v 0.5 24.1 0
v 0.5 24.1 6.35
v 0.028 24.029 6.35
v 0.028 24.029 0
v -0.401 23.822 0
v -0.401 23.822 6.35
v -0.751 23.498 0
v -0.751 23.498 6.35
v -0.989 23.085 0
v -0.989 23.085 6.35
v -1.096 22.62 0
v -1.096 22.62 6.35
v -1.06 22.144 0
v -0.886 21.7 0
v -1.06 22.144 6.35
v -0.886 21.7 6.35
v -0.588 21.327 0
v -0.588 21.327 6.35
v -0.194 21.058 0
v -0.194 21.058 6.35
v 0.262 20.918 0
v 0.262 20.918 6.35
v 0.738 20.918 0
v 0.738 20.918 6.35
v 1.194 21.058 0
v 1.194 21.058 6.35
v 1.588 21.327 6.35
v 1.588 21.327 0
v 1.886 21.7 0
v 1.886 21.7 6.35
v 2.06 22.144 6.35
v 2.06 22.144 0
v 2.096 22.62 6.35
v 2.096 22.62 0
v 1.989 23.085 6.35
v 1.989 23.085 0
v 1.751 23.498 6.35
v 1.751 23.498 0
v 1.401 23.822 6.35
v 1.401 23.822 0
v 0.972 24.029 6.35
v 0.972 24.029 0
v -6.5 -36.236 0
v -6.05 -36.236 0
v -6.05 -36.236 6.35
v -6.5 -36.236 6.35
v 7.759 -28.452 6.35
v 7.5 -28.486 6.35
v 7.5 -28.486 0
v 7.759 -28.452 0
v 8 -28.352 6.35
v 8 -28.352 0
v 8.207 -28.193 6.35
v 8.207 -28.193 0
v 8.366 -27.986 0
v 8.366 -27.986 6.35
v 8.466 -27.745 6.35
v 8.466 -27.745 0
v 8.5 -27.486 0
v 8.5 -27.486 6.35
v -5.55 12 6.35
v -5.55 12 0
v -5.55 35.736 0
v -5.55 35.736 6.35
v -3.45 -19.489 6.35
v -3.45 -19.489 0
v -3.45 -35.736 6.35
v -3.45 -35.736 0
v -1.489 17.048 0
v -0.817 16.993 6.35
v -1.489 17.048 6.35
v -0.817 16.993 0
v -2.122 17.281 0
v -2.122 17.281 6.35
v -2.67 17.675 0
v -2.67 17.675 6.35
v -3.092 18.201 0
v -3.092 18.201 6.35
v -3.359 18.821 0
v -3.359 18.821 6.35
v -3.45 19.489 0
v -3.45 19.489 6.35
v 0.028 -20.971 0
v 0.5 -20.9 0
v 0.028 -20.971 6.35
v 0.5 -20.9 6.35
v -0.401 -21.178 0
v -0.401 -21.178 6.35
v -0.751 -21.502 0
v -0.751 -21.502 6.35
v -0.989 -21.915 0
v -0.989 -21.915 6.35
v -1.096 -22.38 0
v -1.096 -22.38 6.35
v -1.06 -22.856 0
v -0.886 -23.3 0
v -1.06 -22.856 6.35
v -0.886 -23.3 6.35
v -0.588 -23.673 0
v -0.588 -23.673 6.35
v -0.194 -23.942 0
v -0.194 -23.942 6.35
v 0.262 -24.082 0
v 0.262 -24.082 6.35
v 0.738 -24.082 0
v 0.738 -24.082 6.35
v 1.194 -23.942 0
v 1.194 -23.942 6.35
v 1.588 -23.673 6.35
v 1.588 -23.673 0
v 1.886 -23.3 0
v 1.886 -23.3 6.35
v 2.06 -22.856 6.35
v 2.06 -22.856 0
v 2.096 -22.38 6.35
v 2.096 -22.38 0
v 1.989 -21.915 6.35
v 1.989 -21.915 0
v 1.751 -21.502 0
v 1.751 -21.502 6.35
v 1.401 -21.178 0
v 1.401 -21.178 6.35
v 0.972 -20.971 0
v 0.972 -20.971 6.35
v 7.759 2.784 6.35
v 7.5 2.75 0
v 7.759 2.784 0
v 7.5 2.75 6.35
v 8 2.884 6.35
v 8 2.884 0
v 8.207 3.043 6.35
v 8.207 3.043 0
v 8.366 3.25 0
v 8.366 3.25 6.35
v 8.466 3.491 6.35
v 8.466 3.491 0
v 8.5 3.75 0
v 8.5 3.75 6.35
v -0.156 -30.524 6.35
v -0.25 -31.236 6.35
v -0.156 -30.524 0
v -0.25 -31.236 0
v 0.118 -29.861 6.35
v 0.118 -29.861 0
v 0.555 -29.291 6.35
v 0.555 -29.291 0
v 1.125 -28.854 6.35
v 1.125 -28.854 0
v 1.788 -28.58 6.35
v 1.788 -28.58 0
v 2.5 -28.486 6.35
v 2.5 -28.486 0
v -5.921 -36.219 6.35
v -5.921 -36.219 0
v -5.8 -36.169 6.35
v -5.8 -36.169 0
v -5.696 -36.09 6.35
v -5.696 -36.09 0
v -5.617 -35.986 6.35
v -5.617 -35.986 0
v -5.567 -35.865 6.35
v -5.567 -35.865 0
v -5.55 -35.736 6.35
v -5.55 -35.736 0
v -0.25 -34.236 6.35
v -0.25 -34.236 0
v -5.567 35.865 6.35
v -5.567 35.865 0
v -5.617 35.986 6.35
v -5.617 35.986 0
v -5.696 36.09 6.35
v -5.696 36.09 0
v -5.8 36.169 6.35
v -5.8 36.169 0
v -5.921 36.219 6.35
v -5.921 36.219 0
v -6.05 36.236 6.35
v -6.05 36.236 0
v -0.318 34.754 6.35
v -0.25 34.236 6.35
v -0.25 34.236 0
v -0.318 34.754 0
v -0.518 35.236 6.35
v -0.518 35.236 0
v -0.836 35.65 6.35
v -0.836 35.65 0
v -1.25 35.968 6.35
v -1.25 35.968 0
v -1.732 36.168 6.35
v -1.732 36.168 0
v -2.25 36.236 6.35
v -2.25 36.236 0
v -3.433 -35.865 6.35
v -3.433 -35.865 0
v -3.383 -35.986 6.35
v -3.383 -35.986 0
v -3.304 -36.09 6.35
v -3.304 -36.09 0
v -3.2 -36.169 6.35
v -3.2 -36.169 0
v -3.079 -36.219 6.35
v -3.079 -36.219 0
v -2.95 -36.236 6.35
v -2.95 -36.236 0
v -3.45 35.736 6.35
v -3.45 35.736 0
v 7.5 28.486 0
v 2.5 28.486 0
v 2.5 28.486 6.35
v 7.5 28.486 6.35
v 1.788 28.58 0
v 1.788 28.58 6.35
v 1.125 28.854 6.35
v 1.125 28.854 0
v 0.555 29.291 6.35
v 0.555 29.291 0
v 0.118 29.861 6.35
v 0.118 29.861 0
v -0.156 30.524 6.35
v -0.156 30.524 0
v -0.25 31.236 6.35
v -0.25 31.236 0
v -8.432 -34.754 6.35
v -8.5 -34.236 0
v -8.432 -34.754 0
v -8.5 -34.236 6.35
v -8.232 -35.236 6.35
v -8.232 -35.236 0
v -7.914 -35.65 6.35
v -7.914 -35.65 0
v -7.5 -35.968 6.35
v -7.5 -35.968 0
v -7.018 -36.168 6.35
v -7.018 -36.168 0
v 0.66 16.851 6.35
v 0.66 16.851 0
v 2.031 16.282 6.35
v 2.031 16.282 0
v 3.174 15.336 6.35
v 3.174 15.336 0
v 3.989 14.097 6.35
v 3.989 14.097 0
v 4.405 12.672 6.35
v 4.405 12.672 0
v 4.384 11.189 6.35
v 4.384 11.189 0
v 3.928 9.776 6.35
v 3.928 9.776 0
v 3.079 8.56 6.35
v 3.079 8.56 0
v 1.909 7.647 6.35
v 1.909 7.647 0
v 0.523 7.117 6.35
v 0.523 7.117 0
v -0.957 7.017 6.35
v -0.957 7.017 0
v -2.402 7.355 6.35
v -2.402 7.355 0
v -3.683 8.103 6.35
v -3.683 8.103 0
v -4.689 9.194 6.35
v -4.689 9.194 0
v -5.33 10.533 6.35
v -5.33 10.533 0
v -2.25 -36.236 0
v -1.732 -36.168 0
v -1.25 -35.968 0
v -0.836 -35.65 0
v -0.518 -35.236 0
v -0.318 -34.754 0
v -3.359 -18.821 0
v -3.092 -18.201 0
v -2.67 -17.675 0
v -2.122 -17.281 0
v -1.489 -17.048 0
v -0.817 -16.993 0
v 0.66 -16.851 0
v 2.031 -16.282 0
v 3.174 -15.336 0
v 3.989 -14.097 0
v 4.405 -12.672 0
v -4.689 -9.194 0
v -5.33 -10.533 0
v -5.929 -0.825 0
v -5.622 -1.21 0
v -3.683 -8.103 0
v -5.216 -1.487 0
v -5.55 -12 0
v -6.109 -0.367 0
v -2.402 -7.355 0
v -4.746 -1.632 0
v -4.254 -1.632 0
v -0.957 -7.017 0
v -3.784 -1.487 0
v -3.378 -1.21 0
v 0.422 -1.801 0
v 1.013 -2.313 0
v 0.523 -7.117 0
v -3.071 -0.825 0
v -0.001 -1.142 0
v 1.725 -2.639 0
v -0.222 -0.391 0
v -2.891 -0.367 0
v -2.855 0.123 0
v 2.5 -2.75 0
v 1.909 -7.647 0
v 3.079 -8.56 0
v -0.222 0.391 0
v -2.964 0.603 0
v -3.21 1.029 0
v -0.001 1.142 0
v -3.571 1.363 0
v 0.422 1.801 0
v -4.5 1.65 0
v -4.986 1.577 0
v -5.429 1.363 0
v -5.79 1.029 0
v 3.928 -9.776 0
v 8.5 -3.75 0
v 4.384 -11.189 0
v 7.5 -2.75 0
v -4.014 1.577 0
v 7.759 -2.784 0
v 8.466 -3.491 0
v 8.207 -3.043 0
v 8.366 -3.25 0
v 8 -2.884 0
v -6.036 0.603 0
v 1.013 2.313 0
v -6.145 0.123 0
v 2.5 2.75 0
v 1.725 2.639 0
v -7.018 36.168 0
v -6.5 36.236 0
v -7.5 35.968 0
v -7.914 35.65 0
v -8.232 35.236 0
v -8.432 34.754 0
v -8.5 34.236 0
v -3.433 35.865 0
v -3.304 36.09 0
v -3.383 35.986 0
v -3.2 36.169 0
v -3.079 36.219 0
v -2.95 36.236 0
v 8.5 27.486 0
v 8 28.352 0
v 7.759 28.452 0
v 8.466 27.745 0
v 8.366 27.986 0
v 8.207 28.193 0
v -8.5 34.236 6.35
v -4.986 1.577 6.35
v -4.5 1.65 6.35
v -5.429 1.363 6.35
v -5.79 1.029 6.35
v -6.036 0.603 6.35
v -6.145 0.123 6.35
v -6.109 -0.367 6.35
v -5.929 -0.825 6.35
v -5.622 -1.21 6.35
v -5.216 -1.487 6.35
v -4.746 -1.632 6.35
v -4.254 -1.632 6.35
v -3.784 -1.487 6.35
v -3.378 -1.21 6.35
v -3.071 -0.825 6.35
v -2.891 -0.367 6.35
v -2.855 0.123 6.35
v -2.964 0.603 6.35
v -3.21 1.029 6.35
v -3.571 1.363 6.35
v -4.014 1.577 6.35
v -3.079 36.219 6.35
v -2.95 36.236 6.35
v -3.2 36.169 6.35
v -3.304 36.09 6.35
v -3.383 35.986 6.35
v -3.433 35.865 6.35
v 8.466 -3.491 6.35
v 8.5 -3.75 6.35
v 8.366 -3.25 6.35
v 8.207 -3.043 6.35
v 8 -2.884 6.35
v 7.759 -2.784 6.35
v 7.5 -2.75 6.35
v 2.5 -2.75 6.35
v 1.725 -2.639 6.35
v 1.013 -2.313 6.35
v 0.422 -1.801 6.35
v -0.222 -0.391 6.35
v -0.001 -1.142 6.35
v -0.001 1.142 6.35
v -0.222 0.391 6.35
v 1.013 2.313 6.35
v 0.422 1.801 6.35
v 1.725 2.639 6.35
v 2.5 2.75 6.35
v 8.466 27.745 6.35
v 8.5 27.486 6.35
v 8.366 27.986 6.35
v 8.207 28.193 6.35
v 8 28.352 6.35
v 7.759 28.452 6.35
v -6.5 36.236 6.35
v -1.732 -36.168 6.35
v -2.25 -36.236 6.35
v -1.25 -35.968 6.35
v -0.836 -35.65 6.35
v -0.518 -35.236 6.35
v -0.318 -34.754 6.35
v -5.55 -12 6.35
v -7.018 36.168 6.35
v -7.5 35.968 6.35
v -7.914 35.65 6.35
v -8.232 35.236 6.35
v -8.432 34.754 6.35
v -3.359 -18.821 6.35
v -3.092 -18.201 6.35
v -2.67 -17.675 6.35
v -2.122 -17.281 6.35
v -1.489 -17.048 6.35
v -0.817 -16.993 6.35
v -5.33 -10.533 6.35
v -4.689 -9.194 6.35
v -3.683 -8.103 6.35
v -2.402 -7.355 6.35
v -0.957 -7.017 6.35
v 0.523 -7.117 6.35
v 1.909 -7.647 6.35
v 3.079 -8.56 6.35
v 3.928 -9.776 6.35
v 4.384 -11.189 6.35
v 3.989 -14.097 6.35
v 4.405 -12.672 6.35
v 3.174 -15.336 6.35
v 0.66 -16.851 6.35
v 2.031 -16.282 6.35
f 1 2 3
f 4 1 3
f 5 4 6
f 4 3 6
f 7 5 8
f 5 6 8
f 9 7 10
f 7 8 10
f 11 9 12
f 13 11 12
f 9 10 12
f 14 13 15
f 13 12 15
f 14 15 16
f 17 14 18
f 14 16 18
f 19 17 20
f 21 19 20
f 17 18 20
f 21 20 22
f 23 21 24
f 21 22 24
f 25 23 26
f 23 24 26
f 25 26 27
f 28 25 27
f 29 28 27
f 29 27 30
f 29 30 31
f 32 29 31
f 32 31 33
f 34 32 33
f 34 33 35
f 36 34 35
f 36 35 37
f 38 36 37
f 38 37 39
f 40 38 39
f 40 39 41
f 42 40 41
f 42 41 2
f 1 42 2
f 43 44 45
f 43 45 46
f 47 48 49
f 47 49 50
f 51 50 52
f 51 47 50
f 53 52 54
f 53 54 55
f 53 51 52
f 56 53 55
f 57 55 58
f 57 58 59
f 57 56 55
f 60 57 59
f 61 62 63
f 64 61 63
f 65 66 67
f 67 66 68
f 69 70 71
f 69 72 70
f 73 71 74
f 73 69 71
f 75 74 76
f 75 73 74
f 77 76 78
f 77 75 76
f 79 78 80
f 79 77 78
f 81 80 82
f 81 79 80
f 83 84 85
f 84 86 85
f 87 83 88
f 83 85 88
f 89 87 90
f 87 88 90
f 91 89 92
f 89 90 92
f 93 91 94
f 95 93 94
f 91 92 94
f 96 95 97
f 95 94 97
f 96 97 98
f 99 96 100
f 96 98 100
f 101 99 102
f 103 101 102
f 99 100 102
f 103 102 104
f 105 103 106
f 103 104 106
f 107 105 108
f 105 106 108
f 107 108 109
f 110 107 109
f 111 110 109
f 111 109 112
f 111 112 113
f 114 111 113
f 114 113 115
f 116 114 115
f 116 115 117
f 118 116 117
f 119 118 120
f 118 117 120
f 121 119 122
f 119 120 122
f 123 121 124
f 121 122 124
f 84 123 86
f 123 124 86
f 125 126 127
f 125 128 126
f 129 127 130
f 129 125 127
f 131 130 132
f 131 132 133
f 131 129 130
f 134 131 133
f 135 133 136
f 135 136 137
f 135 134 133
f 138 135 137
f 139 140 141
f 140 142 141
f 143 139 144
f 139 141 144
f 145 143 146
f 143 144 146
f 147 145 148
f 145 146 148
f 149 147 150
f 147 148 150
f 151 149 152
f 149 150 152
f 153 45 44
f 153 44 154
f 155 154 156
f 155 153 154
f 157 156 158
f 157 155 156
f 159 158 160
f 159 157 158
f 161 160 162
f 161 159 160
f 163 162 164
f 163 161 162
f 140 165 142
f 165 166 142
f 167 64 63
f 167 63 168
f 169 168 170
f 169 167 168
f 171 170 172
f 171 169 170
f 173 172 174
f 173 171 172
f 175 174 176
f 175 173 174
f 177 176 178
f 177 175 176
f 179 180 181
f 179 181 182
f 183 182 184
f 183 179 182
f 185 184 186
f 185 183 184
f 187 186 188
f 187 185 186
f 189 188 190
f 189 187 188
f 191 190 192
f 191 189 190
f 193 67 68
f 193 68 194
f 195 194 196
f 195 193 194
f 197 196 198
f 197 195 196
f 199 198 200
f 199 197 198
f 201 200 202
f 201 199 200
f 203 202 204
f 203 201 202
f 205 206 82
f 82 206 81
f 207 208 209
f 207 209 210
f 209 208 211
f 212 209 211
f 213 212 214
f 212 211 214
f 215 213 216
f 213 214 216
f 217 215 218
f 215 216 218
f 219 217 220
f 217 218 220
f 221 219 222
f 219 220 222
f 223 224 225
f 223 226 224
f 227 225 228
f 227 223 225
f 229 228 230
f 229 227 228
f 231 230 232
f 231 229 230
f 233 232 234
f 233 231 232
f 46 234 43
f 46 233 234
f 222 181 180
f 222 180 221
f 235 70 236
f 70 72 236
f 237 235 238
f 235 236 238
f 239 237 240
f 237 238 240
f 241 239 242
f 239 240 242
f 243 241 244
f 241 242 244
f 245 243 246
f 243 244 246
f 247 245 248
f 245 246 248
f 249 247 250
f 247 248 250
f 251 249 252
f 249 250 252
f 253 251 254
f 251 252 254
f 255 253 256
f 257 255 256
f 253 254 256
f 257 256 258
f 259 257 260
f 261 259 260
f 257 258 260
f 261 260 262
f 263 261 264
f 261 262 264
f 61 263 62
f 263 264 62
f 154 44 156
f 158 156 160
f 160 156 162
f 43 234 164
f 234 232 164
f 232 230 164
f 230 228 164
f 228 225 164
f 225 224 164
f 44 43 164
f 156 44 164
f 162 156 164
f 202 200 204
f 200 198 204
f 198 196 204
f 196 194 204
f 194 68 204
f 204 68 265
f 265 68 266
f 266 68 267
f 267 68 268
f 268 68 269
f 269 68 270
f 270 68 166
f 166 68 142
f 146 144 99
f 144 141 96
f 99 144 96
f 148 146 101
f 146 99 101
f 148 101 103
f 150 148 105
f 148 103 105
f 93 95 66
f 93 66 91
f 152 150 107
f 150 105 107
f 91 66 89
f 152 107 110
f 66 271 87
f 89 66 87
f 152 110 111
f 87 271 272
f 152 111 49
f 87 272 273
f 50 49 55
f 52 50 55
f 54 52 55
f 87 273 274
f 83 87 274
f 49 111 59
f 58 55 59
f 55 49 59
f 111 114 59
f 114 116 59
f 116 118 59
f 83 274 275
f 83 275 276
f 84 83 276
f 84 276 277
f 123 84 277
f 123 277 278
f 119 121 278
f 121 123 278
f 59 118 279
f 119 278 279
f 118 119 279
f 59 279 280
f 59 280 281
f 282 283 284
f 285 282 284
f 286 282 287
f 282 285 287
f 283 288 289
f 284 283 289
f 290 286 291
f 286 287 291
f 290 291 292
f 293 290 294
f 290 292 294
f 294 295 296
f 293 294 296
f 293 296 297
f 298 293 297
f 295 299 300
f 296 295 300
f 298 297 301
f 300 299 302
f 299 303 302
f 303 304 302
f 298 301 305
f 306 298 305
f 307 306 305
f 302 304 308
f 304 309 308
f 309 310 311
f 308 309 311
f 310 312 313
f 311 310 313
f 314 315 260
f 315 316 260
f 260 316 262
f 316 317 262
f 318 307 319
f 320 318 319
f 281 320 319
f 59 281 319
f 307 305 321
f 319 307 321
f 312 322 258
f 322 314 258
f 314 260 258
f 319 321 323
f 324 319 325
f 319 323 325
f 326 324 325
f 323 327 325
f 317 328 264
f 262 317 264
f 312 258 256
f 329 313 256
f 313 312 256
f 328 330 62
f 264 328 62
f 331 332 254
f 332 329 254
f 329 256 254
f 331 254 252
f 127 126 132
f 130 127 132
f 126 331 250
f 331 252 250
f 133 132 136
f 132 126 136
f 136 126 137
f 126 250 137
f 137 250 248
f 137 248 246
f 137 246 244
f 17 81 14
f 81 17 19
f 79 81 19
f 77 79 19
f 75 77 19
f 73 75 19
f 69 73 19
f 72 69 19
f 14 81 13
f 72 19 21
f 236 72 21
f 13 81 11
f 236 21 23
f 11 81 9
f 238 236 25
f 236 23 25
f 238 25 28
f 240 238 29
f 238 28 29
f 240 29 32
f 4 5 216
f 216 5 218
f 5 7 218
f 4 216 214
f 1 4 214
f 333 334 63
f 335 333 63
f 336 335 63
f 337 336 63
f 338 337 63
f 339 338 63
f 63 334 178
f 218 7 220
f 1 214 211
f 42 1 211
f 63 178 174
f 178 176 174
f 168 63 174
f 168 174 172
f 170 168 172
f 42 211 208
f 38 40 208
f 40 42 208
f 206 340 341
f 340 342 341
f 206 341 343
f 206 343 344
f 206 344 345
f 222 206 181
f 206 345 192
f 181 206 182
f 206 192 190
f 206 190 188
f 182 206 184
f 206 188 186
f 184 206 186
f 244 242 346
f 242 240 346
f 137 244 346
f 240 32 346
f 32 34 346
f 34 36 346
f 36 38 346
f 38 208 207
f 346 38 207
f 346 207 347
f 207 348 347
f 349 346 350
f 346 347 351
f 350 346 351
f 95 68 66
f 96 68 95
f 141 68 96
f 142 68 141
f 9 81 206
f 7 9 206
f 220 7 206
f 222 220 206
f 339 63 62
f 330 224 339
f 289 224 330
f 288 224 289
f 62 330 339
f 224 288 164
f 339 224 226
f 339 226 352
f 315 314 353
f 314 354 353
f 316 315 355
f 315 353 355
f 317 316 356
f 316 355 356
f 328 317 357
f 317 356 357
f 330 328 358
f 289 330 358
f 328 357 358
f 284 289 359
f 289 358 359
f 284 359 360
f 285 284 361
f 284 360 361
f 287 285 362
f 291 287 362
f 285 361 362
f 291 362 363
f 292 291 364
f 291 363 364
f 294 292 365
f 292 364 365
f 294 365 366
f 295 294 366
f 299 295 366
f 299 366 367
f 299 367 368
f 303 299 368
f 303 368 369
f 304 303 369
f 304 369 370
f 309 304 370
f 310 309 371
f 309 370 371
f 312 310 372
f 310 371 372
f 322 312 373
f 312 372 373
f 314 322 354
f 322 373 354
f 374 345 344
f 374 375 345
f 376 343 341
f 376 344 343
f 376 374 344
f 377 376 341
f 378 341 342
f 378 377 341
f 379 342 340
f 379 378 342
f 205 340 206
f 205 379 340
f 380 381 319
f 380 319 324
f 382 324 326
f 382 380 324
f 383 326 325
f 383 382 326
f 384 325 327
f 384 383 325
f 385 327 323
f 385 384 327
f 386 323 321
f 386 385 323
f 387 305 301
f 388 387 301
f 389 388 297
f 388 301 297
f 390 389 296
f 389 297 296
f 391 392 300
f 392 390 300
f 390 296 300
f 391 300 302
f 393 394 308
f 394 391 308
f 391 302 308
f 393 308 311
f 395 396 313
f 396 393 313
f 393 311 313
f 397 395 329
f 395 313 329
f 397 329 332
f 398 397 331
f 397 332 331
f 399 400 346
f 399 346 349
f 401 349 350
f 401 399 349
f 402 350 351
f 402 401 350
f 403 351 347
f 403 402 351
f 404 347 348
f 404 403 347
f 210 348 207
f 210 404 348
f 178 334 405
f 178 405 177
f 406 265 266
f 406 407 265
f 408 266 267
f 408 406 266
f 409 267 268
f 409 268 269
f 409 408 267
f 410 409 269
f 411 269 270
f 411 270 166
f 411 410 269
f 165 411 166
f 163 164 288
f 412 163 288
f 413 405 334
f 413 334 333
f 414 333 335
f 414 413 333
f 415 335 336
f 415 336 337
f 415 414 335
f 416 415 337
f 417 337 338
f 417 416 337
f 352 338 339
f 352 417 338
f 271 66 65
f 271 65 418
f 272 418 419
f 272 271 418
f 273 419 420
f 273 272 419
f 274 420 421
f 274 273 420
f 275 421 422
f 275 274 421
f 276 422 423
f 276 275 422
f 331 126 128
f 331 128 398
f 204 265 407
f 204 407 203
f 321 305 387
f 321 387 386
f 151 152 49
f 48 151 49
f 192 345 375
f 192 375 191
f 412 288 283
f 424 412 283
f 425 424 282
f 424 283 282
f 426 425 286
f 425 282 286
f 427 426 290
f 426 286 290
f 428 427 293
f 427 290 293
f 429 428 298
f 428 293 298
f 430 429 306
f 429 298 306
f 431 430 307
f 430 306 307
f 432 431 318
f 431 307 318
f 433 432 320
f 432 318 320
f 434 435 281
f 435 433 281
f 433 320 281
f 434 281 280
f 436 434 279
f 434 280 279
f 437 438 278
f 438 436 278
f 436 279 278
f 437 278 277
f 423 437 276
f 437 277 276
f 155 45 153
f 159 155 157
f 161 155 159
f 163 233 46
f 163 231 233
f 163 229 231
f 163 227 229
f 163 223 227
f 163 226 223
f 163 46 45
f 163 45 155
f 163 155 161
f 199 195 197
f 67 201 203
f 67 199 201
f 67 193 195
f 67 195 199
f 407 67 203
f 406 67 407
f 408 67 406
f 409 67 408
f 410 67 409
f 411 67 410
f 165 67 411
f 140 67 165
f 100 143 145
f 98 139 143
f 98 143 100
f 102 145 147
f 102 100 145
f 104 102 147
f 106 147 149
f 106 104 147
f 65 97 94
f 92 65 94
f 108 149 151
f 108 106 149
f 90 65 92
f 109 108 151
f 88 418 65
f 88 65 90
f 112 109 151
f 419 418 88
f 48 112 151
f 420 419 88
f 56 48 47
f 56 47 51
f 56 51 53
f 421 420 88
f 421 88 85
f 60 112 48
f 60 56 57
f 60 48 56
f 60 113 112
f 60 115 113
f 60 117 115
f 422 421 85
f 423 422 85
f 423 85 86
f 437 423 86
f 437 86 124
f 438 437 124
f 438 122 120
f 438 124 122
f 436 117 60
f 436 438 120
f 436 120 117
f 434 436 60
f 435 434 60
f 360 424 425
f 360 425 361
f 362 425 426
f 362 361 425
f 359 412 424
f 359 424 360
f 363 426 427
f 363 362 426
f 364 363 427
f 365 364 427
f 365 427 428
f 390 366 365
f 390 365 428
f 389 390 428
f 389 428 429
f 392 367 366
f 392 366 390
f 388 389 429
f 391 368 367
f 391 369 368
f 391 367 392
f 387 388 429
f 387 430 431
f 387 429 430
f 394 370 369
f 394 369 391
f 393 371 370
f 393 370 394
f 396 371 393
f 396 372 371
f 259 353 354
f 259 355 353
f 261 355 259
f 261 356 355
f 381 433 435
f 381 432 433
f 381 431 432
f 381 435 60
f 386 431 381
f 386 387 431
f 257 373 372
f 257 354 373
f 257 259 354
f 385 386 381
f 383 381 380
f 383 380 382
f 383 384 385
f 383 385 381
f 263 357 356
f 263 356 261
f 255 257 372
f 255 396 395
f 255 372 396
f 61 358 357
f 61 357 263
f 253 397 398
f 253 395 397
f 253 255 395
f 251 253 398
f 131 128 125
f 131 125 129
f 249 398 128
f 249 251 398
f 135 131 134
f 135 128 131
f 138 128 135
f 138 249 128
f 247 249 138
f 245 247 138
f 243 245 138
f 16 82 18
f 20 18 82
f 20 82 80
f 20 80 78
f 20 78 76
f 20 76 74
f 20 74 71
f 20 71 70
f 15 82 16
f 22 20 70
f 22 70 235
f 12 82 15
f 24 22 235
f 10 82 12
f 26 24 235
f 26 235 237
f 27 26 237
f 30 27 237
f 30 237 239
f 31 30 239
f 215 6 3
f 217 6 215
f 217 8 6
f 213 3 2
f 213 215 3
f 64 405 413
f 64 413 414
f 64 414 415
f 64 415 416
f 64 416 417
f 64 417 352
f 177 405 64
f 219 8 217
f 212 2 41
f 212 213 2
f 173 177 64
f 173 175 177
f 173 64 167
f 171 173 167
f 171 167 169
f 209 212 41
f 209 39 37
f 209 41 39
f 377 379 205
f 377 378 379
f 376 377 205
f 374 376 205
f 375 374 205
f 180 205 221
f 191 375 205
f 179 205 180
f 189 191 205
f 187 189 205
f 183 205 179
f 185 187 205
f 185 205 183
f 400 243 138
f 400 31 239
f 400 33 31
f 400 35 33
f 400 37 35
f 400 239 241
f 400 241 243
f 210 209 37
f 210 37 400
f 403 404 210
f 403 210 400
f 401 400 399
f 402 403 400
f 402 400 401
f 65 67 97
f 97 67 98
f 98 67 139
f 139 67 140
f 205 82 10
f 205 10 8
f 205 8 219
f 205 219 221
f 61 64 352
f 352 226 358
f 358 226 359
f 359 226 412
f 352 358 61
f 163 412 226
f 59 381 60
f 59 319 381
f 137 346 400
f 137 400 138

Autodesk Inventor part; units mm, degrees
ref_plane "YZ Plane" through (0, 0, 0) normal (1, 0, 0) x (0, 1, 0)
ref_plane "XZ Plane" through (0, 0, 0) normal (0, 1, 0) x (-1, 0, 0)
ref_plane "XY Plane" through (0, 0, 0) normal (0, 0, 1) x (1, 0, 0)
sketch "Sketch1" plane through (0, 0, 0) normal (0, 0, 1) x (1, 0, 0)
  line L0 (8.5, -36.236) -> (-8.5, -36.236)
  line L1 (-8.5, -36.236) -> (-8.5, 36.236)
  line L2 (-8.5, 36.236) -> (8.5, 36.236)
  line L3 (8.5, 36.236) -> (8.5, -36.236)
  line L4 (8.5, -36.236) -> (-8.5, 36.236) construction
  line L5 (-8.5, -36.236) -> (8.5, 36.236) construction
  line L6 (8.5, 0) -> (2.5, 0) construction
  line L7 (8.5, 2.75) -> (2.5, 2.75)
  line L8 (2.5, -2.75) -> (8.5, -2.75)
  arc A0 (8.5, -2.75) -> (8.5, 2.75) centre (8.5, 0) ccw
  arc A1 (2.5, 2.75) -> (2.5, -2.75) centre (2.5, 0) ccw
  line L9 (8.5, 36.236) -> (-0.25, 36.236)
  line L10 (-0.25, 36.236) -> (-0.25, 31.236)
  line L11 (2.5, 28.486) -> (8.5, 28.486)
  line L12 (8.5, 28.486) -> (8.5, 36.236)
  line L13 (8.5, -36.236) -> (-0.25, -36.236)
  line L14 (-0.25, -36.236) -> (-0.25, -31.236)
  line L15 (2.5, -28.486) -> (8.5, -28.486)
  line L16 (8.5, -28.486) -> (8.5, -36.236)
  arc A2 (2.5, -28.486) -> (-0.25, -31.236) centre (2.5, -31.236) ccw
  arc A3 (-0.25, 31.236) -> (2.5, 28.486) centre (2.5, 31.236) ccw
  line L17 (0.5, 22.5) -> (0.5, -22.5) construction
  line L18 (-5.55, 36.236) -> (-3.45, 36.236)
  line L19 (-3.45, 36.236) -> (-3.45, -36.236)
  line L20 (-3.45, -36.236) -> (-5.55, -36.236)
  line L21 (-5.55, -36.236) -> (-5.55, 36.236)
  line L22 (-8.5, 36.236) -> (-0.25, 36.236)
  circle A4 centre (-0.55, 12) radius 3.5
  circle A5 centre (-0.55, 12) radius 5
  circle A6 centre (-0.95, 19.4893) radius 2.5
  circle A7 centre (-4.5, 0) radius 4 construction
  point P0 (0, 0)
  point P1 (5.5, 0)
  point P2 (0.5, 0)
  point P3 (-8.5, 0)
  point P4 (-0.25, -36.236)
  point P5 (8.5, -28.486)
  point P6 (-0.25, 36.236)
  point P7 (-0.8167, 16.9929)
  point P8 (-3.45, 19.4893)
  point P9 (-3.45, 36.236)
  point P10 (-5.55, 36.236)
  point P11 (-5.55, 12)
  dimension "d0" = 17
  dimension "d1" = 72.472
  dimension "d3" = 5.5
  dimension "d4" = 11
  dimension "d6" = 5
  dimension "d7" = 5
  dimension "d8" = 45
  dimension "d9" = 9
  dimension "d22" = 2.1
  dimension "d24" = 7
  dimension "d25" = 1.5
  dimension "d26" = 5
  dimension "d27" = 12
  dimension "d29" = 8
  dimension "d40" = 2.95
extrude "Extrusion1" add sketch "Sketch1" along normal blind 6.35 contours L0 L19 A5 A6 L2 L10 A3 L11 L3 L7 A1 L8 L15 A2 L14 | L0 L21 A5 L19 | L0 L1 L2 L21 | A5 L19 A4 | L19 A4 A5 | L21 L2 L19 A5 | A4 L19 | L19 A4 | L19 A6 A5 | A6
fillet "Fillet1" radius 2 2 edges at (-8.5, -36.236, 3.175) (-8.5, 36.236, 3.175)
fillet "Fillet2" radius 2 2 edges at (-0.25, -36.236, 3.175) (-0.25, 36.236, 3.175)
fillet "Fillet3" radius 1 4 edges at (8.5, -28.486, 3.175) (8.5, -2.75, 3.175) (8.5, 2.75, 3.175) (8.5, 28.486, 3.175)
hole "Hole1" at (0.5, 22.5, 0) at (0.5, -22.5, 0) direction (0, 0, 1) diameter 3.2 end through all
hole "Hole2" at (-4.5, 0, 0) direction (0, 0, 1) diameter 3.3 end through all
extrude "Extrusion2" cut sketch "Sketch1" along normal blind 6.35 contours A5 L19 A4 | L19 A4 A5 | L21 L2 L19 A5 | A4 L19 | L19 A4 | L19 A6 A5
mirror "Mirror1" about plane through (0, 0, 0) normal (0, 1, 0) of "Extrusion2"
fillet "Fillet4" radius 0.5 4 edges at (-5.55, 36.236, 3.175) (-3.45, 36.236, 3.175) (-3.45, -36.236, 3.175) (-5.55, -36.236, 3.175)
equation "\"d7\" = d6"
properties part number "Gantry Belt Clamp" material "Aluminum 6061"
